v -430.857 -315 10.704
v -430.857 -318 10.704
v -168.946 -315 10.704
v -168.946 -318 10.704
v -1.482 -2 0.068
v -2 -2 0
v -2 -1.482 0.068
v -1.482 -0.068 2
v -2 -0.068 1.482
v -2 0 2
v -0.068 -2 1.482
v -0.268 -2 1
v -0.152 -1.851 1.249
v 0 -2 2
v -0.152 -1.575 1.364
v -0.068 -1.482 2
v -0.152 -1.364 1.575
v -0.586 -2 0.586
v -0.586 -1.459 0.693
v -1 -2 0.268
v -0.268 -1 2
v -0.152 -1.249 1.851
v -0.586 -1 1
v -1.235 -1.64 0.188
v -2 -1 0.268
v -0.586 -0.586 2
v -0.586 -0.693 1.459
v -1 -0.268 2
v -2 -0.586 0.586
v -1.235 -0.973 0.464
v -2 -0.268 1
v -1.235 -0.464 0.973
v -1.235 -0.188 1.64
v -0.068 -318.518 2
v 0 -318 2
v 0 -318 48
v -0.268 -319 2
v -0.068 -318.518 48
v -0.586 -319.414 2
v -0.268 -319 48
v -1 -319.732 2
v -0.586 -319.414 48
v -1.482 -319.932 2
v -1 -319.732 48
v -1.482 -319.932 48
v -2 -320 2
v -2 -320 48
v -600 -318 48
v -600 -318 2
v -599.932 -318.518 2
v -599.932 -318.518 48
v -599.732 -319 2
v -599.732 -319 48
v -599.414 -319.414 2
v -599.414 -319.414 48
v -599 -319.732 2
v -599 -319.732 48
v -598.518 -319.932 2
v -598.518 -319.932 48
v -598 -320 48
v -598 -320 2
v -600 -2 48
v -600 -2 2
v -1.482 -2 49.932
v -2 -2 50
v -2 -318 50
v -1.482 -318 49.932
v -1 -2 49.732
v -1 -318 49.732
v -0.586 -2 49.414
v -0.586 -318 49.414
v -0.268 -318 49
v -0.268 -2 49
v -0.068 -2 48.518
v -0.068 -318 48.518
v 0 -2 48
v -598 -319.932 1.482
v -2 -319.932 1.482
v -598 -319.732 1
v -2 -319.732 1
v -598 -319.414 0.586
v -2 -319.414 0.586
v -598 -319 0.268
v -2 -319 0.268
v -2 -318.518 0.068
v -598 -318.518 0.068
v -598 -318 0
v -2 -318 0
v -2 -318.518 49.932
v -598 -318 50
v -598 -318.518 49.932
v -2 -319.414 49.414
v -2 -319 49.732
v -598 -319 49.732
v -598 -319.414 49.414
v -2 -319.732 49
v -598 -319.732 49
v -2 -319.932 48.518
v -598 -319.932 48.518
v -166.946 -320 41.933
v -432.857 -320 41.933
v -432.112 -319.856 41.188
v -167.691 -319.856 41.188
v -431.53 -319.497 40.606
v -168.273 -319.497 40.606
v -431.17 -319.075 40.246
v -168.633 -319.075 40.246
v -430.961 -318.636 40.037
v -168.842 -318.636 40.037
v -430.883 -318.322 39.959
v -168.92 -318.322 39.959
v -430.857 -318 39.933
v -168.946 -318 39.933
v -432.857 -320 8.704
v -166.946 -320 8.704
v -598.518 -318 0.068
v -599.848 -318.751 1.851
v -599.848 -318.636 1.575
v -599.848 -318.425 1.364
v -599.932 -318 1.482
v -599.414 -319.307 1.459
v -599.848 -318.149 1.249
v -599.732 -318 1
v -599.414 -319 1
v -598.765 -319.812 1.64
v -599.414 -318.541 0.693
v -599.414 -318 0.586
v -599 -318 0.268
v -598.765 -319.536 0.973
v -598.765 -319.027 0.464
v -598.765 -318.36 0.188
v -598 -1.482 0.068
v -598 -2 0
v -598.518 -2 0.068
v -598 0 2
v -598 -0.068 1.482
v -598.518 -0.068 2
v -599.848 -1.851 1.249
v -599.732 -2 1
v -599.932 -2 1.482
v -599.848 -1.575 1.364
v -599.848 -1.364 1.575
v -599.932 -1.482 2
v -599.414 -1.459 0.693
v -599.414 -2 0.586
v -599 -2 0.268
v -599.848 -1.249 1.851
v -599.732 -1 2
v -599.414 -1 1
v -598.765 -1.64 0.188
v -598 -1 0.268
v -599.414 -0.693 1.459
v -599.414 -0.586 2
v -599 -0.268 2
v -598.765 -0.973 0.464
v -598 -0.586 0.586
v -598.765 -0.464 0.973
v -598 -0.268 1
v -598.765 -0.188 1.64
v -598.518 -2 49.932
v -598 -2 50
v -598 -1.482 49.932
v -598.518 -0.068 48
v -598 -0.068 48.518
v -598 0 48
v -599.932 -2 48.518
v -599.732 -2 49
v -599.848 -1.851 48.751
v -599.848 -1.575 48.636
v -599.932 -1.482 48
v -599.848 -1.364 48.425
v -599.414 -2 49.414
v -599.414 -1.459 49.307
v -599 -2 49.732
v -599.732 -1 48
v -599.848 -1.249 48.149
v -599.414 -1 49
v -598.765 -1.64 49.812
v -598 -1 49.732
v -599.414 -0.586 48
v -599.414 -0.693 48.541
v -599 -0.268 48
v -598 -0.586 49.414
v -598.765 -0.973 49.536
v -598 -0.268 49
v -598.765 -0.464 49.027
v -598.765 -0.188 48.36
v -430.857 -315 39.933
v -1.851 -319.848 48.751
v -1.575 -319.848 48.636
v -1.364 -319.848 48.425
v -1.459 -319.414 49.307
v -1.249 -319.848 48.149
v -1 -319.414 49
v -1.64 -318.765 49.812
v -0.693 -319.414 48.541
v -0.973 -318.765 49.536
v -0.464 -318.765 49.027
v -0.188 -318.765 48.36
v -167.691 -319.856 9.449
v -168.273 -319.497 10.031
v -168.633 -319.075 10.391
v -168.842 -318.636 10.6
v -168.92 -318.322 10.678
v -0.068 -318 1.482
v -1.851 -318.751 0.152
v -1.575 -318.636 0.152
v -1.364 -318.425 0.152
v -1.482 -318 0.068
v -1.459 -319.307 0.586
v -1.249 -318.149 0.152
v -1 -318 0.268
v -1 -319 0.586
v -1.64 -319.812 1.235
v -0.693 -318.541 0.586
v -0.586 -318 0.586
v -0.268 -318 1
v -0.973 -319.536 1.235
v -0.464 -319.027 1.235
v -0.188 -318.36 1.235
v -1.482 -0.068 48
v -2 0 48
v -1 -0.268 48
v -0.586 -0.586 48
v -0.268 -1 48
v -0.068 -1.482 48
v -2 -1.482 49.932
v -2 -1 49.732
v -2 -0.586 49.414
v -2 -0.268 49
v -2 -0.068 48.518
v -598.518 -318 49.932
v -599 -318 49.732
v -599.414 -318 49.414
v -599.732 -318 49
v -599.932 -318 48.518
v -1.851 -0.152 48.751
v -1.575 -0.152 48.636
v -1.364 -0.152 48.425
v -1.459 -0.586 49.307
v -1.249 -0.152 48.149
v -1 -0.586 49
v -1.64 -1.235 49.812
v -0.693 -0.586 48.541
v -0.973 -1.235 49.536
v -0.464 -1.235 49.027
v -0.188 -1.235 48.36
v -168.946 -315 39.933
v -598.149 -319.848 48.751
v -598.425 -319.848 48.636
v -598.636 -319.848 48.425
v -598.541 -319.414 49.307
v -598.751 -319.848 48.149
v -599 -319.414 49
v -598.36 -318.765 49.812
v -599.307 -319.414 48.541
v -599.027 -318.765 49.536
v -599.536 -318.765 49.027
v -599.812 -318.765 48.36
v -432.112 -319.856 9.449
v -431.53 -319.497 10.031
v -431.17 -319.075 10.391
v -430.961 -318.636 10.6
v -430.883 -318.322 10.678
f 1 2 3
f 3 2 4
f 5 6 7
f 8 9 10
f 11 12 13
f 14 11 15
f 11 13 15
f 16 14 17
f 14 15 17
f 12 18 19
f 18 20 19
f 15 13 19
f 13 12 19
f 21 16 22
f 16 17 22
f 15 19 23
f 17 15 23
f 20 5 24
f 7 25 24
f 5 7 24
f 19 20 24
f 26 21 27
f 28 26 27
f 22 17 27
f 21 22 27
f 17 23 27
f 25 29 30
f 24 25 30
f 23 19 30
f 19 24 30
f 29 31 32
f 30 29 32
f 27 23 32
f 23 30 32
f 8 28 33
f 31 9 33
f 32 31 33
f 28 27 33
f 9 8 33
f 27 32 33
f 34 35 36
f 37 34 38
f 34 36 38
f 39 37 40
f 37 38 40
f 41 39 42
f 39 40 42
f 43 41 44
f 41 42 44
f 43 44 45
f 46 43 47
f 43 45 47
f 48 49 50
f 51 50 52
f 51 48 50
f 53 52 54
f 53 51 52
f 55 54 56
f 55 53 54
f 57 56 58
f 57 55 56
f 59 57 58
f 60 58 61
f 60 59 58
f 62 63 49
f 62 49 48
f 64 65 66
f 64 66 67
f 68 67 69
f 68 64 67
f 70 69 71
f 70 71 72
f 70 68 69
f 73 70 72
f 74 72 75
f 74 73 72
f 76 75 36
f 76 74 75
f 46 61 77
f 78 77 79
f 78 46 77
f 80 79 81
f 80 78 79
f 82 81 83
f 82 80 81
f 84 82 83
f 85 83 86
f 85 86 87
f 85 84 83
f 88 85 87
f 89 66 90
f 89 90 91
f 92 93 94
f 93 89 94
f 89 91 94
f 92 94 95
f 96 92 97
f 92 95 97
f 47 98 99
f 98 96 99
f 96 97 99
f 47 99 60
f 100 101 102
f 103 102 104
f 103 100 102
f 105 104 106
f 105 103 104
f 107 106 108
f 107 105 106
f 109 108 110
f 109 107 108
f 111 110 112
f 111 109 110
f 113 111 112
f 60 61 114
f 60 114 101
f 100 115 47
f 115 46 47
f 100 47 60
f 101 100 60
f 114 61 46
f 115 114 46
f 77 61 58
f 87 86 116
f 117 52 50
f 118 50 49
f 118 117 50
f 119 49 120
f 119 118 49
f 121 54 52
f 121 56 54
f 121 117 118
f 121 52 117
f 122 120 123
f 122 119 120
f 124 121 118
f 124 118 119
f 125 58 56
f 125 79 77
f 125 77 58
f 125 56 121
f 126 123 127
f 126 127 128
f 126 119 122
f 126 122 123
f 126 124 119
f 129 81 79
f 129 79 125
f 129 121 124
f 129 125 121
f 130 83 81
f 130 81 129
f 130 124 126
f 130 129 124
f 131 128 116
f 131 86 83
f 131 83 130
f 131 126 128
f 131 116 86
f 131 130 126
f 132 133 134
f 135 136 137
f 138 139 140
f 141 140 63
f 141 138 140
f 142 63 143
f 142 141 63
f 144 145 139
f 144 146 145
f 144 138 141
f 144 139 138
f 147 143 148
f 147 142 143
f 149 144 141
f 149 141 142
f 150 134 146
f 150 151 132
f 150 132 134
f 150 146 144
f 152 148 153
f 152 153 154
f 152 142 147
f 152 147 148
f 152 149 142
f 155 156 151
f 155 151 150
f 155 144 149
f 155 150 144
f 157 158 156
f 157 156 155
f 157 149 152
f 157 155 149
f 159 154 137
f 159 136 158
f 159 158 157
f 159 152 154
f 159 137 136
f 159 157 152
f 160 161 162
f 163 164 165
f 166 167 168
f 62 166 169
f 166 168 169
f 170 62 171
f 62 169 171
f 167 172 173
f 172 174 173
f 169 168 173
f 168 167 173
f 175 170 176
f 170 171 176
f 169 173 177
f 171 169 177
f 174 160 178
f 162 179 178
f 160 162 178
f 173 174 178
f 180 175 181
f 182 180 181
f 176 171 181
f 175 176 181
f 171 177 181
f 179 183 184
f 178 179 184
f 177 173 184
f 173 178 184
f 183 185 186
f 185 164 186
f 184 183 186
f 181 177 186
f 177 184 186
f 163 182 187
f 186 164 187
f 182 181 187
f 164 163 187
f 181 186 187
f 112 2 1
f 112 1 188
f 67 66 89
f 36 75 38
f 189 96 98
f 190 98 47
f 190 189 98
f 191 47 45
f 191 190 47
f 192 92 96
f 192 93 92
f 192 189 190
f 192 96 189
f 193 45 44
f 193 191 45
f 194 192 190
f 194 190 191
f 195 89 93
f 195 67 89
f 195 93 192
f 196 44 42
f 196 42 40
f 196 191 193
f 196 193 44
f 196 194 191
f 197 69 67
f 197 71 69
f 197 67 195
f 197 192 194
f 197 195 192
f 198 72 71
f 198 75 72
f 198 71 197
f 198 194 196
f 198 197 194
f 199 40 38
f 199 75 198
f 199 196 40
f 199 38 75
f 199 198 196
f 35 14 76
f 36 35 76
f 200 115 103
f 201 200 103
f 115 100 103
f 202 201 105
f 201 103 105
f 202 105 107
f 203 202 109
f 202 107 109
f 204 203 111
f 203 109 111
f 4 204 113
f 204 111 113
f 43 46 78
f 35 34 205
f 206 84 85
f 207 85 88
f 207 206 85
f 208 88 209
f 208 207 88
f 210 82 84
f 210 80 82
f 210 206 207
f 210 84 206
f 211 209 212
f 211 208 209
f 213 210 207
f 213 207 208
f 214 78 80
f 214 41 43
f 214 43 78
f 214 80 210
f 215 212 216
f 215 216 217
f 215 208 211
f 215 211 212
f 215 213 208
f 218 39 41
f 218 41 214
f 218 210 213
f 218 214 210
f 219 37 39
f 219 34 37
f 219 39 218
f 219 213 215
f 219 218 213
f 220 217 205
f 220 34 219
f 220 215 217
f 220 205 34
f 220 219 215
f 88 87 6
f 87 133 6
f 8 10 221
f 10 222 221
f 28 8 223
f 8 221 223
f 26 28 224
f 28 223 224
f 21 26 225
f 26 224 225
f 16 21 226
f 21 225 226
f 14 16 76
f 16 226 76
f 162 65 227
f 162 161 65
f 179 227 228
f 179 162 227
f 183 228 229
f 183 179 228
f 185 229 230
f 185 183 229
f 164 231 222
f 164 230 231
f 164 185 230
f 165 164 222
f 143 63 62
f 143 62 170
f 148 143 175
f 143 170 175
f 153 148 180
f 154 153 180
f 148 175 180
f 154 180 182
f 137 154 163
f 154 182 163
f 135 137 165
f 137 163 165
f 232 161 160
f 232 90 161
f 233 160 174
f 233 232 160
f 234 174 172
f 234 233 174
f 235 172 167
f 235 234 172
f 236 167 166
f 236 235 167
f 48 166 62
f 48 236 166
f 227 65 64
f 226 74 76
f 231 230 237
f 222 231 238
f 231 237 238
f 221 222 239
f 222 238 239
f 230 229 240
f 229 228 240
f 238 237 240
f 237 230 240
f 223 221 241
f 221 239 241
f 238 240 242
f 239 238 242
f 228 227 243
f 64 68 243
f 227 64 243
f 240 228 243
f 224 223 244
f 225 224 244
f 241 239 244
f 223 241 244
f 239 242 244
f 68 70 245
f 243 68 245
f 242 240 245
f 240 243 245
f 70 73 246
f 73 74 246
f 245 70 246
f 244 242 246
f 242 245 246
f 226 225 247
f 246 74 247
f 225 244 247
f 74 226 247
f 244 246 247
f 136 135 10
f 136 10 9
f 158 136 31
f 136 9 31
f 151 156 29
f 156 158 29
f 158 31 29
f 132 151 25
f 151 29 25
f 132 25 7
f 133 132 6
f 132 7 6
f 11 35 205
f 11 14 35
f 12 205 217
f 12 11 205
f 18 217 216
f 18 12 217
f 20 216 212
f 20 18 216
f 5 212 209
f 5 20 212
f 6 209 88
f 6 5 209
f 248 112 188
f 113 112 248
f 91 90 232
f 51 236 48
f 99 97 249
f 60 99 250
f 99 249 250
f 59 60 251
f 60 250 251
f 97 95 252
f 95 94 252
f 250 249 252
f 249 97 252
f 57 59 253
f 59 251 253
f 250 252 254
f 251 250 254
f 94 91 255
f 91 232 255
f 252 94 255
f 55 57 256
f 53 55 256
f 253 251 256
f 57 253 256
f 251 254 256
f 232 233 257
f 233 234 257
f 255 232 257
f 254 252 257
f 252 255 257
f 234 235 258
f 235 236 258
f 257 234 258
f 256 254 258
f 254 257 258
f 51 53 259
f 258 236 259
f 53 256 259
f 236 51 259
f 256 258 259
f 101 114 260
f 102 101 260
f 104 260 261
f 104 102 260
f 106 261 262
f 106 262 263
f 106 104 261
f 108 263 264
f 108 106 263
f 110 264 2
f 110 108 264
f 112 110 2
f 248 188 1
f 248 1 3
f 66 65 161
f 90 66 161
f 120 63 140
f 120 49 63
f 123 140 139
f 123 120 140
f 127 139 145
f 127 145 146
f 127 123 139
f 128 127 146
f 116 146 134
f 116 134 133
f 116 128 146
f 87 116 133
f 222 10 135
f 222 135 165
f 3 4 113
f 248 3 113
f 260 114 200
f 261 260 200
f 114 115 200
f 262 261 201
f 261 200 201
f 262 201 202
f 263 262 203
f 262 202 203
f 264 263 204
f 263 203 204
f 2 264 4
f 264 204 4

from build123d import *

# Parameters (mm, degrees)
F0_W     = 54.5732825994
F0_H     = 50.0136017799
F1_DEPTH = 50
F2_DEPTH = 600
F3_DEPTH = 320
F4_W     = 261.9102597237
F4_H     = 29.2285606265
F5_DEPTH = 5
F6_R     = 2


with BuildPart() as f1:
    # F0 (on Top) → F1 (new body)
    with BuildSketch(Plane.XY):
        with Locations((-27.2866412997, -25.00680089)):
            Rectangle(F0_W, F0_H)
    extrude(amount=F1_DEPTH)

    # F2 (add): a face of the model
    f2_faces = [f1.faces().sort_by_distance(p)[0] for p in [
        (0, -25.00680089, 25),
    ]]
    extrude(f2_faces, amount=-F2_DEPTH)

    # F3 (add): a face of the model
    f3_faces = [f1.faces().sort_by_distance(p)[0] for p in [
        (-300, 0, 25),
    ]]
    extrude(f3_faces, amount=-F3_DEPTH)

    # F4 (on face) → F5 (cut)
    with BuildSketch(Plane.XZ.offset(320)):
        with Locations((-299.9015450478, 25.3184698522)):
            Rectangle(F4_W, F4_H)
    extrude(amount=-F5_DEPTH, mode=Mode.SUBTRACT)

    # F6
    f6_edges = [f1.edges().sort_by_distance(p)[0] for p in [
        (0, -160, 50),
        (-300, 0, 50),
        (-600, -160, 50),
        (-300, -320, 50),
        (0, -320, 25),
        (-300, -320, 0),
        (-600, -320, 25),
        (-299.901545, -320, 39.93275),
        (-430.856675, -320, 25.31847),
        (-299.901545, -320, 10.70419),
        (-168.946415, -320, 25.31847),
        (-300, 0, 0),
        (-600, -160, 0),
        (0, -160, 0),
        (-600, 0, 25),
        (0, 0, 25),
    ]]
    fillet(f6_edges, radius=F6_R)


solid = f1.part
